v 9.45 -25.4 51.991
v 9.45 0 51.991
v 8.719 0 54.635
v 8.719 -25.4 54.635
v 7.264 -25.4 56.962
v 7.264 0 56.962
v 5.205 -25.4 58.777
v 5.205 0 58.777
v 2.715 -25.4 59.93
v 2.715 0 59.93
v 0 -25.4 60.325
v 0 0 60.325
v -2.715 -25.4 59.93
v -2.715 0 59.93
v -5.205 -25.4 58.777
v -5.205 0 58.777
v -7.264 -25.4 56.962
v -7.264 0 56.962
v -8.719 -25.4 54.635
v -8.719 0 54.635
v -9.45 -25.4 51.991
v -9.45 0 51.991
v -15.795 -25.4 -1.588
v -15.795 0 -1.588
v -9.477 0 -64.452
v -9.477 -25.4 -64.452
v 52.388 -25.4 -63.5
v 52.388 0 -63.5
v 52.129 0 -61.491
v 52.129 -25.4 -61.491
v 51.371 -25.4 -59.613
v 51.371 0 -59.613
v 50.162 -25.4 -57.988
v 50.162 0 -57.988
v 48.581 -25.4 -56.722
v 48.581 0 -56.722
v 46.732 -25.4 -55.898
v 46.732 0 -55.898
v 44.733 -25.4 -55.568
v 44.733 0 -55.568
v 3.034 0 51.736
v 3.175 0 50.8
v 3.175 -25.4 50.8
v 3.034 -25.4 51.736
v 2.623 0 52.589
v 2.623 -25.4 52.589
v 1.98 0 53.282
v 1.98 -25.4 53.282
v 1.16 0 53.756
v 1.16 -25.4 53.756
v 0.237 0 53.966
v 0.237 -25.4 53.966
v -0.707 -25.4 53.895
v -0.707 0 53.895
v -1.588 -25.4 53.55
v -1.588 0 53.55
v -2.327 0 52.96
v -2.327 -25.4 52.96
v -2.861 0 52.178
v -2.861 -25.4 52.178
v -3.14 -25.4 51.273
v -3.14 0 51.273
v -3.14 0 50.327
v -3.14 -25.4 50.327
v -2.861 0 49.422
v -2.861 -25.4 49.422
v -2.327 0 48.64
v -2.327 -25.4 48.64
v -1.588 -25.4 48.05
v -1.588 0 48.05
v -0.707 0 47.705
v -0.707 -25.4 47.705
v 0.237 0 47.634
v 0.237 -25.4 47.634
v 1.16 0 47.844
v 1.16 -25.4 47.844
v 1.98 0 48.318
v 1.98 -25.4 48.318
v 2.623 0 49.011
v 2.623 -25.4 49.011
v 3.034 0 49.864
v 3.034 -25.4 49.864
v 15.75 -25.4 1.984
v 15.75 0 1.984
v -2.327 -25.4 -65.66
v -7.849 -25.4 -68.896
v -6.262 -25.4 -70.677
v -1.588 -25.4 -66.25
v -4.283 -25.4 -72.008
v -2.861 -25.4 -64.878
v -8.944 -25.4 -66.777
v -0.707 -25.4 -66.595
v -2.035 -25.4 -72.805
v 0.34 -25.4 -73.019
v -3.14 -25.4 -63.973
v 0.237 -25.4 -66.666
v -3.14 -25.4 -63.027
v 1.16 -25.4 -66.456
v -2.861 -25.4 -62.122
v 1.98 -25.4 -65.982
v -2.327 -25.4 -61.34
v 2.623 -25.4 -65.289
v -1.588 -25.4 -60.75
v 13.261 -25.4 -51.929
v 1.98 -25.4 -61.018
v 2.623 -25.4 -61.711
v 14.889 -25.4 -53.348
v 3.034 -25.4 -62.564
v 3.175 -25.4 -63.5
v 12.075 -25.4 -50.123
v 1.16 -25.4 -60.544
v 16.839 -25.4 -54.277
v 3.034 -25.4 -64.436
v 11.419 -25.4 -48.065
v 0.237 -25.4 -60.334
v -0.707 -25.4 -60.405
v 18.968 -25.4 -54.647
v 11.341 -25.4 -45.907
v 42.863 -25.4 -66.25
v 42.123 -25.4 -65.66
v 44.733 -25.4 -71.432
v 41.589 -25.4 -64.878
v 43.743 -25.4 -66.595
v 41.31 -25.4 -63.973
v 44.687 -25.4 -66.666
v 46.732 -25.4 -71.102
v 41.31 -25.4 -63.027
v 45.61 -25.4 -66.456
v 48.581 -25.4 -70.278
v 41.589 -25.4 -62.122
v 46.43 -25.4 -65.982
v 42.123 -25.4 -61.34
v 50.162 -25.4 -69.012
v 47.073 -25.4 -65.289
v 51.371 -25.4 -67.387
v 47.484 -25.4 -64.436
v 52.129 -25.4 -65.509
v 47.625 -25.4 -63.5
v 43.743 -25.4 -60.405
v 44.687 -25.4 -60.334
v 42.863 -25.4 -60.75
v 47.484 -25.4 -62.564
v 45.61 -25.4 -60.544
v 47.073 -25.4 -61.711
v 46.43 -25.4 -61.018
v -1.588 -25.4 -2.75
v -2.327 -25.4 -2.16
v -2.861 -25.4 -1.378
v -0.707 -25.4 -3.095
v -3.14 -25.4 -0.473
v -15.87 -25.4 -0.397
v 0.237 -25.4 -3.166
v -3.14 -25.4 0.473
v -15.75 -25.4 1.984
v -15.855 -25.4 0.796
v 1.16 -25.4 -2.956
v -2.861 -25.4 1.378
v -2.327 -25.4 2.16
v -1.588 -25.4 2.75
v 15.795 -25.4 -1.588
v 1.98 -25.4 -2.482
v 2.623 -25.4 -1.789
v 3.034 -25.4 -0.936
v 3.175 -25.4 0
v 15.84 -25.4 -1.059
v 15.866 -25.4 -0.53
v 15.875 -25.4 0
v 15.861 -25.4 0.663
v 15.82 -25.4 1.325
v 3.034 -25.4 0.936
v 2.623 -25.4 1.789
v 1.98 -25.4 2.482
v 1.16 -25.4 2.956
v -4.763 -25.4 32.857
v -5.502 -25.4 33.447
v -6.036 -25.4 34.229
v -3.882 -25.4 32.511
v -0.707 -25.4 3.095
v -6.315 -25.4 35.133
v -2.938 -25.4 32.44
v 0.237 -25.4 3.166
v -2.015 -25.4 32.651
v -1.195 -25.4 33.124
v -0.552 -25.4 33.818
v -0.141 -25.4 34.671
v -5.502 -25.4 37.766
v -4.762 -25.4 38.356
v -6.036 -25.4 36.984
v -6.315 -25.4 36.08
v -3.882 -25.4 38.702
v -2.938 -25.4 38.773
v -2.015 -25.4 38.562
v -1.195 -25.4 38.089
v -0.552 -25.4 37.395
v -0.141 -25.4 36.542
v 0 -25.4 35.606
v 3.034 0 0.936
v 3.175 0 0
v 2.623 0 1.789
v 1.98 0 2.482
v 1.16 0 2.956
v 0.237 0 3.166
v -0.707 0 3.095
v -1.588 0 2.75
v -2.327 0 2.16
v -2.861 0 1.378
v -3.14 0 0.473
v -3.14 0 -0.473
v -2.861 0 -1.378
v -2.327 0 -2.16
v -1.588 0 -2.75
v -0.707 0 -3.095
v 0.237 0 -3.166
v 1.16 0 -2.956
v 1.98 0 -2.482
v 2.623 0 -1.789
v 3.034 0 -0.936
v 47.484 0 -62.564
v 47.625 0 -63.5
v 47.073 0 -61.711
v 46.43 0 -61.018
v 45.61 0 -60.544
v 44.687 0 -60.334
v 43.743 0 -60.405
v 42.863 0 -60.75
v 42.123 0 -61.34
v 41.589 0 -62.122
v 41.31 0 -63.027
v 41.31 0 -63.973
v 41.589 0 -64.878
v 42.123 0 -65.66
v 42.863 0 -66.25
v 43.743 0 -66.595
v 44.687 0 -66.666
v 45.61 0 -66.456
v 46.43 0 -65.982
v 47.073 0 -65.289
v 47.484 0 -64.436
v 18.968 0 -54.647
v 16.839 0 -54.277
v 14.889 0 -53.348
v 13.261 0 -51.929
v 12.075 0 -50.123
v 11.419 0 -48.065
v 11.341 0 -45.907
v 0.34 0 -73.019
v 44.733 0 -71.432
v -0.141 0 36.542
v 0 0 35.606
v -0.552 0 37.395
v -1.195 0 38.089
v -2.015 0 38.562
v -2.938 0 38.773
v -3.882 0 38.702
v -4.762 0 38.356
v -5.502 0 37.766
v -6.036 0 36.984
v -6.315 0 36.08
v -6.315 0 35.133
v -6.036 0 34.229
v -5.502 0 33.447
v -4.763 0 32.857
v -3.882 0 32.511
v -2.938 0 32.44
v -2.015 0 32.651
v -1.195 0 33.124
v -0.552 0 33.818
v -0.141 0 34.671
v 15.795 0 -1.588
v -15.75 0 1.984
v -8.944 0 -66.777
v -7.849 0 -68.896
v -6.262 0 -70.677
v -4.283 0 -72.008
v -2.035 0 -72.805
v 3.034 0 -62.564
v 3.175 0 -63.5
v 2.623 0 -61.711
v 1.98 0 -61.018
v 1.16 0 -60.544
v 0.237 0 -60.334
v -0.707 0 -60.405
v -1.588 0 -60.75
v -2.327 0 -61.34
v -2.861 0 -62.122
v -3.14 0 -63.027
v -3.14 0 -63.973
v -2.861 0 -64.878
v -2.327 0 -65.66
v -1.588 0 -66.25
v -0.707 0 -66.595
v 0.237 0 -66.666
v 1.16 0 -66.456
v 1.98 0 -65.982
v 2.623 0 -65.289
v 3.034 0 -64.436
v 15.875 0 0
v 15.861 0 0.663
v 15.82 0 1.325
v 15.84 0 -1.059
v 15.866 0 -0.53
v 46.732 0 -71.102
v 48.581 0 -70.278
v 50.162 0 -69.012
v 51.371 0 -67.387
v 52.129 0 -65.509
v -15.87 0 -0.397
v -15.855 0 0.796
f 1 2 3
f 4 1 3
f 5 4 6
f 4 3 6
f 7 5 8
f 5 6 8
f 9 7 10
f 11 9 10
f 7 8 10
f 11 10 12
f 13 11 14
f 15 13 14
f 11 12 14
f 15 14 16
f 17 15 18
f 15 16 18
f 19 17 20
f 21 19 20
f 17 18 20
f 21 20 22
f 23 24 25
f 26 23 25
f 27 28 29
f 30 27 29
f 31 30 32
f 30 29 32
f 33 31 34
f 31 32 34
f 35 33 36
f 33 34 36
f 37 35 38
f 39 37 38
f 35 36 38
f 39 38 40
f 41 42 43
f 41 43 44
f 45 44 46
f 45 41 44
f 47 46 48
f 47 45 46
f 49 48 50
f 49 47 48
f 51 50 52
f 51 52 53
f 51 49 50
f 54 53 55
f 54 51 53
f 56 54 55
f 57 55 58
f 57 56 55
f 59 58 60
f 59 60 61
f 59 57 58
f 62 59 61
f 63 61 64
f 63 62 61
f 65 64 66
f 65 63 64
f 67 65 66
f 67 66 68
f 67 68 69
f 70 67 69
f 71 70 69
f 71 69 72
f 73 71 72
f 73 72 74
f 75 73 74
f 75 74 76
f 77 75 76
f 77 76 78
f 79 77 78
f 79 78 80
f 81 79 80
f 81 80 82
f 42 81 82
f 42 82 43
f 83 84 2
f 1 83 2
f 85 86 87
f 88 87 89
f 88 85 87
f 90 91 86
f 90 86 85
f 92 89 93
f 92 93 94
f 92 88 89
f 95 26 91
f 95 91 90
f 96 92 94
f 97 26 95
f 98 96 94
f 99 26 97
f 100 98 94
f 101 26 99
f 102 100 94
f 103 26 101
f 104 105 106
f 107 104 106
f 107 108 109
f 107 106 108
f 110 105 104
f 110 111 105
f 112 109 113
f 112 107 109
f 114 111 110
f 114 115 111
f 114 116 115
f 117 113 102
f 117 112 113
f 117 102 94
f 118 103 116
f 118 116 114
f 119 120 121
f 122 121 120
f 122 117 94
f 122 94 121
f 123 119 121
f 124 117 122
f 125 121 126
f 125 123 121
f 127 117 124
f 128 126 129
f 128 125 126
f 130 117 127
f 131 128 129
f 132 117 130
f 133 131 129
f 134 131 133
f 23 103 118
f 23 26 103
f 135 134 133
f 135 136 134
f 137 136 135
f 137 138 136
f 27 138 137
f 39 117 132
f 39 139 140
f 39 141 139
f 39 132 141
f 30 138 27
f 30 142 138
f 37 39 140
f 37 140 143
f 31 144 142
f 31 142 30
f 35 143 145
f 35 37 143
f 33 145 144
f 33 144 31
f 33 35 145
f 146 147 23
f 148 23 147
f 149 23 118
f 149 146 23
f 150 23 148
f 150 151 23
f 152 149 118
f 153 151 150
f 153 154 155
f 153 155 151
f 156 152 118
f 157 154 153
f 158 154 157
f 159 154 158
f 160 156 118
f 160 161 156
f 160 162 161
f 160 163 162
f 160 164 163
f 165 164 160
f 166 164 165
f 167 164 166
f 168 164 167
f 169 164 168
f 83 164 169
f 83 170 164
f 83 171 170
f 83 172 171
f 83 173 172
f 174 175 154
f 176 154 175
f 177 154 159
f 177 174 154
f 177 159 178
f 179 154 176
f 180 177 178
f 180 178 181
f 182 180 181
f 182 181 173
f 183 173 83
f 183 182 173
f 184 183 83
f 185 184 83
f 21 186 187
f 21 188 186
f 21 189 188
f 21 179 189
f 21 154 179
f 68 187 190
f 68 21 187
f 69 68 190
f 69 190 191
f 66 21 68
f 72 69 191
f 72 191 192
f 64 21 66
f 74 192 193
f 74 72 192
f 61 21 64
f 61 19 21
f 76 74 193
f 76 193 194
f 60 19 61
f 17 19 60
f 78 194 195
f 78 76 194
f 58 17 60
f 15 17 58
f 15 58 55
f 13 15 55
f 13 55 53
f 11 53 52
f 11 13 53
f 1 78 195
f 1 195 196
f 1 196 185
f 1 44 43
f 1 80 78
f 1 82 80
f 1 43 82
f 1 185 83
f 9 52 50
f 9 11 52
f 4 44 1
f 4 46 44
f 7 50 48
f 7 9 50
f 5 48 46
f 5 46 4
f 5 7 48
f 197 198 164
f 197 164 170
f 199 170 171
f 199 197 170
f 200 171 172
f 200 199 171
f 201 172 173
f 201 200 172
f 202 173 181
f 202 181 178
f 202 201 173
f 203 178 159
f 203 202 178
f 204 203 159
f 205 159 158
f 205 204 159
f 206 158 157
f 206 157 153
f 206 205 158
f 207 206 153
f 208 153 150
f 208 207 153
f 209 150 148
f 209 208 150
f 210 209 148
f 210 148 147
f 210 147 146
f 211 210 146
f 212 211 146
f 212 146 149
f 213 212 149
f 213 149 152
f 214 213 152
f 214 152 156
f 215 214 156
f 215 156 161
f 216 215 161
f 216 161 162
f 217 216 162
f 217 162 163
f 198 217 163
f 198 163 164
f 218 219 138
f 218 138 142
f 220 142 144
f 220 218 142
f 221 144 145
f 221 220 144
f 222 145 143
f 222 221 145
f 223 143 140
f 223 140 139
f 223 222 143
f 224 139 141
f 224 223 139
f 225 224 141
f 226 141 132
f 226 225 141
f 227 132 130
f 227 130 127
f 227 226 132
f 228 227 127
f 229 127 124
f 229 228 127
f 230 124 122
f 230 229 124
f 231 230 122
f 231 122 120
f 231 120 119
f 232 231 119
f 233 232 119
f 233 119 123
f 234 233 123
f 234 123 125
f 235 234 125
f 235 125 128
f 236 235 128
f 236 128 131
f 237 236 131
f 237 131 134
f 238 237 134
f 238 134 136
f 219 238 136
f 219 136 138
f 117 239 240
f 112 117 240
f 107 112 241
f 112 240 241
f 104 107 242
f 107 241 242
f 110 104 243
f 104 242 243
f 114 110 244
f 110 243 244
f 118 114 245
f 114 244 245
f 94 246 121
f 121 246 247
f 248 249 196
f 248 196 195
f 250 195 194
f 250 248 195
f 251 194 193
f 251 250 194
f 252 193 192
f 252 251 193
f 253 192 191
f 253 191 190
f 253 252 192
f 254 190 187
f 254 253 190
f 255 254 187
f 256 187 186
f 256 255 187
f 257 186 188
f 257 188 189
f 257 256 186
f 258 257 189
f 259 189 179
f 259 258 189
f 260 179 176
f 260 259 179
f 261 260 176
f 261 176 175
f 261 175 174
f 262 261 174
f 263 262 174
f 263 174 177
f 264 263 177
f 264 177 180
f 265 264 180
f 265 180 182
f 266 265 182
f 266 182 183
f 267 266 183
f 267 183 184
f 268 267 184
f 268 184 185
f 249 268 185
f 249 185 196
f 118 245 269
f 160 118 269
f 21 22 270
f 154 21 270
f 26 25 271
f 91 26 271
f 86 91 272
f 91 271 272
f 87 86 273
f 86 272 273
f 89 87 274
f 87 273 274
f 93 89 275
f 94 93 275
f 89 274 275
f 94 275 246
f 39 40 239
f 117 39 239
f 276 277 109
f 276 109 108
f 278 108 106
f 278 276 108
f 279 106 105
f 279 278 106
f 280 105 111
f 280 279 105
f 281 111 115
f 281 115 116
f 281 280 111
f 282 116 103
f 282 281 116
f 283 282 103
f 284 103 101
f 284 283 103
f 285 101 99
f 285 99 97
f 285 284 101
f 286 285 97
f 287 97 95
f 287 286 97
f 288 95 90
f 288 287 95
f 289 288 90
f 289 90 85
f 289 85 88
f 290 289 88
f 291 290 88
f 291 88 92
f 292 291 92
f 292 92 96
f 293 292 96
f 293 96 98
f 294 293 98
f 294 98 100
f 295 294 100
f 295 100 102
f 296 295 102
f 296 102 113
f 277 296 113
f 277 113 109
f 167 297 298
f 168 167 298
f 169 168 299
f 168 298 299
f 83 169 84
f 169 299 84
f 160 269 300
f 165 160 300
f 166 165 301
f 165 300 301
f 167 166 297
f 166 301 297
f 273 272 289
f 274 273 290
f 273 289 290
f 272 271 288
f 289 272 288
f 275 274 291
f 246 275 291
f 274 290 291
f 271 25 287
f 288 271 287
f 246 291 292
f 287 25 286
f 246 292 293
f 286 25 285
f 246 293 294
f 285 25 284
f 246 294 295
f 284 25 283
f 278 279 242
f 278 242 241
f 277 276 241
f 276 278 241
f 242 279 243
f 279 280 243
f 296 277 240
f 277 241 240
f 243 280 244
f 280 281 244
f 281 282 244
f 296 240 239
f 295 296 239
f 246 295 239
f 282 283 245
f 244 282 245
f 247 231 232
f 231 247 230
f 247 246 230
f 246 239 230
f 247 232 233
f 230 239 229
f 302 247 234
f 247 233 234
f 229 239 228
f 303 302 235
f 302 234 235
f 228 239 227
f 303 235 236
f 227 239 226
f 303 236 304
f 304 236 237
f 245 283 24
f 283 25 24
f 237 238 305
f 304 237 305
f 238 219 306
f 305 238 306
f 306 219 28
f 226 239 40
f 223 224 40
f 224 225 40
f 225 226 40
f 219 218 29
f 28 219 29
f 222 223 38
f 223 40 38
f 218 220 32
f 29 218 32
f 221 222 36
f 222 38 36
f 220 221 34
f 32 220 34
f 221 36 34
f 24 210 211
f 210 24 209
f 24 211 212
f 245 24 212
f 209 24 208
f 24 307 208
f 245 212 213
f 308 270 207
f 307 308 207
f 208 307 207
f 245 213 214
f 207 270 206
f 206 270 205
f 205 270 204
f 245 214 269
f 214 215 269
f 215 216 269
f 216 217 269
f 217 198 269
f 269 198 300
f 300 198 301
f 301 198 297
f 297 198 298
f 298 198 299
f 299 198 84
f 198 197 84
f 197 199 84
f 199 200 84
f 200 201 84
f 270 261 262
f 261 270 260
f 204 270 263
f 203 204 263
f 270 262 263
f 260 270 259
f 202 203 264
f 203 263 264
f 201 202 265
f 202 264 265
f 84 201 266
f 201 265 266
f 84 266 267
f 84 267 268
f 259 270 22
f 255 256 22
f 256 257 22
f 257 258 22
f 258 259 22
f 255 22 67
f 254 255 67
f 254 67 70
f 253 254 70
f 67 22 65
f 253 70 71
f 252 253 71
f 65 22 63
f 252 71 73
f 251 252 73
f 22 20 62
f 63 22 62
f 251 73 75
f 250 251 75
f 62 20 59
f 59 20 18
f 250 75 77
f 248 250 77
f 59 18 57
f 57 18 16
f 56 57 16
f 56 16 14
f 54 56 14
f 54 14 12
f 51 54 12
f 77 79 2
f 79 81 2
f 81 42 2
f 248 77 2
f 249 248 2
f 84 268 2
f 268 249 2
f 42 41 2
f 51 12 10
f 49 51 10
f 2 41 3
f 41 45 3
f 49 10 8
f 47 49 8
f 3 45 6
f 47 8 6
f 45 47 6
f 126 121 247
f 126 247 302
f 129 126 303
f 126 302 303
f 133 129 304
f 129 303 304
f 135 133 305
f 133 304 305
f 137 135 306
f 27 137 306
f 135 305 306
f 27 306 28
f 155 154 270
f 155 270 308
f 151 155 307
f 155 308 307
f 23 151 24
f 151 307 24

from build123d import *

# Parameters (mm, degrees)
F0_R     = 3.175
F1_DEPTH = 3.048
F2_DEPTH = 25.4


with BuildPart() as f1:
    # F0 (on Front) → F1 (new body)
    with BuildSketch(Plane.XZ):
        with BuildLine():
            ThreePointArc((-9.450293, 51.990625), (-0.596483, 41.293695), (9.525, 50.8))
            ThreePointArc((9.525, 50.8), (9.506305, 51.396483), (9.450293, 51.990625))
            ThreePointArc((9.450293, 51.990625), (0, 60.325), (-9.450293, 51.990625))
        make_face()
        with Locations((0, 50.8)):
            Circle(F0_R, mode=Mode.SUBTRACT)
        with BuildLine():
            ThreePointArc((9.525, -63.5), (-0.476848, -53.986944), (-9.477255, -64.4525))
            ThreePointArc((-9.477255, -64.4525), (-6.262383, -70.67692), (0.340179, -73.018923))
            ThreePointArc((0.340179, -73.018923), (6.854408, -70.113827), (9.525, -63.5))
        make_face()
        with Locations((0, -63.5)):
            Circle(F0_R, mode=Mode.SUBTRACT)
        with BuildLine():
            ThreePointArc((44.733482, -55.567564), (36.5125, -63.5), (44.733482, -71.432436))
            ThreePointArc((44.733482, -71.432436), (50.162007, -69.011523), (52.3875, -63.5))
            ThreePointArc((52.3875, -63.5), (50.162007, -57.988477), (44.733482, -55.567564))
        make_face()
        with Locations((44.45, -63.5)):
            Circle(F0_R, mode=Mode.SUBTRACT)
        with BuildLine():
            ThreePointArc((9.450293, 51.990625), (9.506305, 51.396483), (9.525, 50.8))
            ThreePointArc((9.525, 50.8), (-0.596483, 41.293695), (-9.450293, 51.990625))
            Line((-9.450293, 51.990625), (-15.750488, 1.984375))
            ThreePointArc((-15.750488, 1.984375), (0, 15.875), (15.750488, 1.984375))
            Line((15.750488, 1.984375), (9.450293, 51.990625))
        make_face()
        with Locations((-3.175, 35.60644)):
            Circle(F0_R, mode=Mode.SUBTRACT)
        with BuildLine():
            ThreePointArc((15.875, 0), (15.843841, 0.994139), (15.750488, 1.984375))
            ThreePointArc((15.750488, 1.984375), (0, 15.875), (-15.750488, 1.984375))
            ThreePointArc((-15.750488, 1.984375), (-15.873744, 0.199705), (-15.795426, -1.5875))
            ThreePointArc((-15.795426, -1.5875), (0, -15.875), (15.795426, -1.5875))
            ThreePointArc((15.795426, -1.5875), (15.855094, -0.794747), (15.875, 0))
        make_face()
        Circle(F0_R, mode=Mode.SUBTRACT)
        with BuildLine():
            ThreePointArc((15.795426, -1.5875), (0, -15.875), (-15.795426, -1.5875))
            Line((-15.795426, -1.5875), (-9.477255, -64.4525))
            ThreePointArc((-9.477255, -64.4525), (-0.476848, -53.986944), (9.525, -63.5))
            ThreePointArc((9.525, -63.5), (6.854408, -70.113827), (0.340179, -73.018923))
            Line((0.340179, -73.018923), (44.733482, -71.432436))
            ThreePointArc((44.733482, -71.432436), (36.5125, -63.5), (44.733482, -55.567564))
            Line((44.733482, -55.567564), (18.9676, -54.646766))
            ThreePointArc((18.9676, -54.646766), (13.2612, -51.928641), (11.341187, -45.906618))
            Line((11.341187, -45.906618), (15.795426, -1.5875))
        make_face()
    extrude(amount=F1_DEPTH)

    # F0 (on Front) → F2 (join)
    with BuildSketch(Plane.XZ):
        with BuildLine():
            ThreePointArc((-9.450293, 51.990625), (-0.596483, 41.293695), (9.525, 50.8))
            ThreePointArc((9.525, 50.8), (9.506305, 51.396483), (9.450293, 51.990625))
            ThreePointArc((9.450293, 51.990625), (0, 60.325), (-9.450293, 51.990625))
        make_face()
        with Locations((0, 50.8)):
            Circle(F0_R, mode=Mode.SUBTRACT)
        with BuildLine():
            ThreePointArc((9.450293, 51.990625), (9.506305, 51.396483), (9.525, 50.8))
            ThreePointArc((9.525, 50.8), (-0.596483, 41.293695), (-9.450293, 51.990625))
            Line((-9.450293, 51.990625), (-15.750488, 1.984375))
            ThreePointArc((-15.750488, 1.984375), (0, 15.875), (15.750488, 1.984375))
            Line((15.750488, 1.984375), (9.450293, 51.990625))
        make_face()
        with Locations((-3.175, 35.60644)):
            Circle(F0_R, mode=Mode.SUBTRACT)
        with BuildLine():
            ThreePointArc((15.875, 0), (15.843841, 0.994139), (15.750488, 1.984375))
            ThreePointArc((15.750488, 1.984375), (0, 15.875), (-15.750488, 1.984375))
            ThreePointArc((-15.750488, 1.984375), (-15.873744, 0.199705), (-15.795426, -1.5875))
            ThreePointArc((-15.795426, -1.5875), (0, -15.875), (15.795426, -1.5875))
            ThreePointArc((15.795426, -1.5875), (15.855094, -0.794747), (15.875, 0))
        make_face()
        Circle(F0_R, mode=Mode.SUBTRACT)
        with BuildLine():
            ThreePointArc((15.795426, -1.5875), (0, -15.875), (-15.795426, -1.5875))
            Line((-15.795426, -1.5875), (-9.477255, -64.4525))
            ThreePointArc((-9.477255, -64.4525), (-0.476848, -53.986944), (9.525, -63.5))
            ThreePointArc((9.525, -63.5), (6.854408, -70.113827), (0.340179, -73.018923))
            Line((0.340179, -73.018923), (44.733482, -71.432436))
            ThreePointArc((44.733482, -71.432436), (36.5125, -63.5), (44.733482, -55.567564))
            Line((44.733482, -55.567564), (18.9676, -54.646766))
            ThreePointArc((18.9676, -54.646766), (13.2612, -51.928641), (11.341187, -45.906618))
            Line((11.341187, -45.906618), (15.795426, -1.5875))
        make_face()
        with BuildLine():
            ThreePointArc((9.525, -63.5), (-0.476848, -53.986944), (-9.477255, -64.4525))
            ThreePointArc((-9.477255, -64.4525), (-6.262383, -70.67692), (0.340179, -73.018923))
            ThreePointArc((0.340179, -73.018923), (6.854408, -70.113827), (9.525, -63.5))
        make_face()
        with Locations((0, -63.5)):
            Circle(F0_R, mode=Mode.SUBTRACT)
        with BuildLine():
            ThreePointArc((44.733482, -55.567564), (36.5125, -63.5), (44.733482, -71.432436))
            ThreePointArc((44.733482, -71.432436), (50.162007, -69.011523), (52.3875, -63.5))
            ThreePointArc((52.3875, -63.5), (50.162007, -57.988477), (44.733482, -55.567564))
        make_face()
        with Locations((44.45, -63.5)):
            Circle(F0_R, mode=Mode.SUBTRACT)
    extrude(amount=F2_DEPTH)


solid = f1.part
